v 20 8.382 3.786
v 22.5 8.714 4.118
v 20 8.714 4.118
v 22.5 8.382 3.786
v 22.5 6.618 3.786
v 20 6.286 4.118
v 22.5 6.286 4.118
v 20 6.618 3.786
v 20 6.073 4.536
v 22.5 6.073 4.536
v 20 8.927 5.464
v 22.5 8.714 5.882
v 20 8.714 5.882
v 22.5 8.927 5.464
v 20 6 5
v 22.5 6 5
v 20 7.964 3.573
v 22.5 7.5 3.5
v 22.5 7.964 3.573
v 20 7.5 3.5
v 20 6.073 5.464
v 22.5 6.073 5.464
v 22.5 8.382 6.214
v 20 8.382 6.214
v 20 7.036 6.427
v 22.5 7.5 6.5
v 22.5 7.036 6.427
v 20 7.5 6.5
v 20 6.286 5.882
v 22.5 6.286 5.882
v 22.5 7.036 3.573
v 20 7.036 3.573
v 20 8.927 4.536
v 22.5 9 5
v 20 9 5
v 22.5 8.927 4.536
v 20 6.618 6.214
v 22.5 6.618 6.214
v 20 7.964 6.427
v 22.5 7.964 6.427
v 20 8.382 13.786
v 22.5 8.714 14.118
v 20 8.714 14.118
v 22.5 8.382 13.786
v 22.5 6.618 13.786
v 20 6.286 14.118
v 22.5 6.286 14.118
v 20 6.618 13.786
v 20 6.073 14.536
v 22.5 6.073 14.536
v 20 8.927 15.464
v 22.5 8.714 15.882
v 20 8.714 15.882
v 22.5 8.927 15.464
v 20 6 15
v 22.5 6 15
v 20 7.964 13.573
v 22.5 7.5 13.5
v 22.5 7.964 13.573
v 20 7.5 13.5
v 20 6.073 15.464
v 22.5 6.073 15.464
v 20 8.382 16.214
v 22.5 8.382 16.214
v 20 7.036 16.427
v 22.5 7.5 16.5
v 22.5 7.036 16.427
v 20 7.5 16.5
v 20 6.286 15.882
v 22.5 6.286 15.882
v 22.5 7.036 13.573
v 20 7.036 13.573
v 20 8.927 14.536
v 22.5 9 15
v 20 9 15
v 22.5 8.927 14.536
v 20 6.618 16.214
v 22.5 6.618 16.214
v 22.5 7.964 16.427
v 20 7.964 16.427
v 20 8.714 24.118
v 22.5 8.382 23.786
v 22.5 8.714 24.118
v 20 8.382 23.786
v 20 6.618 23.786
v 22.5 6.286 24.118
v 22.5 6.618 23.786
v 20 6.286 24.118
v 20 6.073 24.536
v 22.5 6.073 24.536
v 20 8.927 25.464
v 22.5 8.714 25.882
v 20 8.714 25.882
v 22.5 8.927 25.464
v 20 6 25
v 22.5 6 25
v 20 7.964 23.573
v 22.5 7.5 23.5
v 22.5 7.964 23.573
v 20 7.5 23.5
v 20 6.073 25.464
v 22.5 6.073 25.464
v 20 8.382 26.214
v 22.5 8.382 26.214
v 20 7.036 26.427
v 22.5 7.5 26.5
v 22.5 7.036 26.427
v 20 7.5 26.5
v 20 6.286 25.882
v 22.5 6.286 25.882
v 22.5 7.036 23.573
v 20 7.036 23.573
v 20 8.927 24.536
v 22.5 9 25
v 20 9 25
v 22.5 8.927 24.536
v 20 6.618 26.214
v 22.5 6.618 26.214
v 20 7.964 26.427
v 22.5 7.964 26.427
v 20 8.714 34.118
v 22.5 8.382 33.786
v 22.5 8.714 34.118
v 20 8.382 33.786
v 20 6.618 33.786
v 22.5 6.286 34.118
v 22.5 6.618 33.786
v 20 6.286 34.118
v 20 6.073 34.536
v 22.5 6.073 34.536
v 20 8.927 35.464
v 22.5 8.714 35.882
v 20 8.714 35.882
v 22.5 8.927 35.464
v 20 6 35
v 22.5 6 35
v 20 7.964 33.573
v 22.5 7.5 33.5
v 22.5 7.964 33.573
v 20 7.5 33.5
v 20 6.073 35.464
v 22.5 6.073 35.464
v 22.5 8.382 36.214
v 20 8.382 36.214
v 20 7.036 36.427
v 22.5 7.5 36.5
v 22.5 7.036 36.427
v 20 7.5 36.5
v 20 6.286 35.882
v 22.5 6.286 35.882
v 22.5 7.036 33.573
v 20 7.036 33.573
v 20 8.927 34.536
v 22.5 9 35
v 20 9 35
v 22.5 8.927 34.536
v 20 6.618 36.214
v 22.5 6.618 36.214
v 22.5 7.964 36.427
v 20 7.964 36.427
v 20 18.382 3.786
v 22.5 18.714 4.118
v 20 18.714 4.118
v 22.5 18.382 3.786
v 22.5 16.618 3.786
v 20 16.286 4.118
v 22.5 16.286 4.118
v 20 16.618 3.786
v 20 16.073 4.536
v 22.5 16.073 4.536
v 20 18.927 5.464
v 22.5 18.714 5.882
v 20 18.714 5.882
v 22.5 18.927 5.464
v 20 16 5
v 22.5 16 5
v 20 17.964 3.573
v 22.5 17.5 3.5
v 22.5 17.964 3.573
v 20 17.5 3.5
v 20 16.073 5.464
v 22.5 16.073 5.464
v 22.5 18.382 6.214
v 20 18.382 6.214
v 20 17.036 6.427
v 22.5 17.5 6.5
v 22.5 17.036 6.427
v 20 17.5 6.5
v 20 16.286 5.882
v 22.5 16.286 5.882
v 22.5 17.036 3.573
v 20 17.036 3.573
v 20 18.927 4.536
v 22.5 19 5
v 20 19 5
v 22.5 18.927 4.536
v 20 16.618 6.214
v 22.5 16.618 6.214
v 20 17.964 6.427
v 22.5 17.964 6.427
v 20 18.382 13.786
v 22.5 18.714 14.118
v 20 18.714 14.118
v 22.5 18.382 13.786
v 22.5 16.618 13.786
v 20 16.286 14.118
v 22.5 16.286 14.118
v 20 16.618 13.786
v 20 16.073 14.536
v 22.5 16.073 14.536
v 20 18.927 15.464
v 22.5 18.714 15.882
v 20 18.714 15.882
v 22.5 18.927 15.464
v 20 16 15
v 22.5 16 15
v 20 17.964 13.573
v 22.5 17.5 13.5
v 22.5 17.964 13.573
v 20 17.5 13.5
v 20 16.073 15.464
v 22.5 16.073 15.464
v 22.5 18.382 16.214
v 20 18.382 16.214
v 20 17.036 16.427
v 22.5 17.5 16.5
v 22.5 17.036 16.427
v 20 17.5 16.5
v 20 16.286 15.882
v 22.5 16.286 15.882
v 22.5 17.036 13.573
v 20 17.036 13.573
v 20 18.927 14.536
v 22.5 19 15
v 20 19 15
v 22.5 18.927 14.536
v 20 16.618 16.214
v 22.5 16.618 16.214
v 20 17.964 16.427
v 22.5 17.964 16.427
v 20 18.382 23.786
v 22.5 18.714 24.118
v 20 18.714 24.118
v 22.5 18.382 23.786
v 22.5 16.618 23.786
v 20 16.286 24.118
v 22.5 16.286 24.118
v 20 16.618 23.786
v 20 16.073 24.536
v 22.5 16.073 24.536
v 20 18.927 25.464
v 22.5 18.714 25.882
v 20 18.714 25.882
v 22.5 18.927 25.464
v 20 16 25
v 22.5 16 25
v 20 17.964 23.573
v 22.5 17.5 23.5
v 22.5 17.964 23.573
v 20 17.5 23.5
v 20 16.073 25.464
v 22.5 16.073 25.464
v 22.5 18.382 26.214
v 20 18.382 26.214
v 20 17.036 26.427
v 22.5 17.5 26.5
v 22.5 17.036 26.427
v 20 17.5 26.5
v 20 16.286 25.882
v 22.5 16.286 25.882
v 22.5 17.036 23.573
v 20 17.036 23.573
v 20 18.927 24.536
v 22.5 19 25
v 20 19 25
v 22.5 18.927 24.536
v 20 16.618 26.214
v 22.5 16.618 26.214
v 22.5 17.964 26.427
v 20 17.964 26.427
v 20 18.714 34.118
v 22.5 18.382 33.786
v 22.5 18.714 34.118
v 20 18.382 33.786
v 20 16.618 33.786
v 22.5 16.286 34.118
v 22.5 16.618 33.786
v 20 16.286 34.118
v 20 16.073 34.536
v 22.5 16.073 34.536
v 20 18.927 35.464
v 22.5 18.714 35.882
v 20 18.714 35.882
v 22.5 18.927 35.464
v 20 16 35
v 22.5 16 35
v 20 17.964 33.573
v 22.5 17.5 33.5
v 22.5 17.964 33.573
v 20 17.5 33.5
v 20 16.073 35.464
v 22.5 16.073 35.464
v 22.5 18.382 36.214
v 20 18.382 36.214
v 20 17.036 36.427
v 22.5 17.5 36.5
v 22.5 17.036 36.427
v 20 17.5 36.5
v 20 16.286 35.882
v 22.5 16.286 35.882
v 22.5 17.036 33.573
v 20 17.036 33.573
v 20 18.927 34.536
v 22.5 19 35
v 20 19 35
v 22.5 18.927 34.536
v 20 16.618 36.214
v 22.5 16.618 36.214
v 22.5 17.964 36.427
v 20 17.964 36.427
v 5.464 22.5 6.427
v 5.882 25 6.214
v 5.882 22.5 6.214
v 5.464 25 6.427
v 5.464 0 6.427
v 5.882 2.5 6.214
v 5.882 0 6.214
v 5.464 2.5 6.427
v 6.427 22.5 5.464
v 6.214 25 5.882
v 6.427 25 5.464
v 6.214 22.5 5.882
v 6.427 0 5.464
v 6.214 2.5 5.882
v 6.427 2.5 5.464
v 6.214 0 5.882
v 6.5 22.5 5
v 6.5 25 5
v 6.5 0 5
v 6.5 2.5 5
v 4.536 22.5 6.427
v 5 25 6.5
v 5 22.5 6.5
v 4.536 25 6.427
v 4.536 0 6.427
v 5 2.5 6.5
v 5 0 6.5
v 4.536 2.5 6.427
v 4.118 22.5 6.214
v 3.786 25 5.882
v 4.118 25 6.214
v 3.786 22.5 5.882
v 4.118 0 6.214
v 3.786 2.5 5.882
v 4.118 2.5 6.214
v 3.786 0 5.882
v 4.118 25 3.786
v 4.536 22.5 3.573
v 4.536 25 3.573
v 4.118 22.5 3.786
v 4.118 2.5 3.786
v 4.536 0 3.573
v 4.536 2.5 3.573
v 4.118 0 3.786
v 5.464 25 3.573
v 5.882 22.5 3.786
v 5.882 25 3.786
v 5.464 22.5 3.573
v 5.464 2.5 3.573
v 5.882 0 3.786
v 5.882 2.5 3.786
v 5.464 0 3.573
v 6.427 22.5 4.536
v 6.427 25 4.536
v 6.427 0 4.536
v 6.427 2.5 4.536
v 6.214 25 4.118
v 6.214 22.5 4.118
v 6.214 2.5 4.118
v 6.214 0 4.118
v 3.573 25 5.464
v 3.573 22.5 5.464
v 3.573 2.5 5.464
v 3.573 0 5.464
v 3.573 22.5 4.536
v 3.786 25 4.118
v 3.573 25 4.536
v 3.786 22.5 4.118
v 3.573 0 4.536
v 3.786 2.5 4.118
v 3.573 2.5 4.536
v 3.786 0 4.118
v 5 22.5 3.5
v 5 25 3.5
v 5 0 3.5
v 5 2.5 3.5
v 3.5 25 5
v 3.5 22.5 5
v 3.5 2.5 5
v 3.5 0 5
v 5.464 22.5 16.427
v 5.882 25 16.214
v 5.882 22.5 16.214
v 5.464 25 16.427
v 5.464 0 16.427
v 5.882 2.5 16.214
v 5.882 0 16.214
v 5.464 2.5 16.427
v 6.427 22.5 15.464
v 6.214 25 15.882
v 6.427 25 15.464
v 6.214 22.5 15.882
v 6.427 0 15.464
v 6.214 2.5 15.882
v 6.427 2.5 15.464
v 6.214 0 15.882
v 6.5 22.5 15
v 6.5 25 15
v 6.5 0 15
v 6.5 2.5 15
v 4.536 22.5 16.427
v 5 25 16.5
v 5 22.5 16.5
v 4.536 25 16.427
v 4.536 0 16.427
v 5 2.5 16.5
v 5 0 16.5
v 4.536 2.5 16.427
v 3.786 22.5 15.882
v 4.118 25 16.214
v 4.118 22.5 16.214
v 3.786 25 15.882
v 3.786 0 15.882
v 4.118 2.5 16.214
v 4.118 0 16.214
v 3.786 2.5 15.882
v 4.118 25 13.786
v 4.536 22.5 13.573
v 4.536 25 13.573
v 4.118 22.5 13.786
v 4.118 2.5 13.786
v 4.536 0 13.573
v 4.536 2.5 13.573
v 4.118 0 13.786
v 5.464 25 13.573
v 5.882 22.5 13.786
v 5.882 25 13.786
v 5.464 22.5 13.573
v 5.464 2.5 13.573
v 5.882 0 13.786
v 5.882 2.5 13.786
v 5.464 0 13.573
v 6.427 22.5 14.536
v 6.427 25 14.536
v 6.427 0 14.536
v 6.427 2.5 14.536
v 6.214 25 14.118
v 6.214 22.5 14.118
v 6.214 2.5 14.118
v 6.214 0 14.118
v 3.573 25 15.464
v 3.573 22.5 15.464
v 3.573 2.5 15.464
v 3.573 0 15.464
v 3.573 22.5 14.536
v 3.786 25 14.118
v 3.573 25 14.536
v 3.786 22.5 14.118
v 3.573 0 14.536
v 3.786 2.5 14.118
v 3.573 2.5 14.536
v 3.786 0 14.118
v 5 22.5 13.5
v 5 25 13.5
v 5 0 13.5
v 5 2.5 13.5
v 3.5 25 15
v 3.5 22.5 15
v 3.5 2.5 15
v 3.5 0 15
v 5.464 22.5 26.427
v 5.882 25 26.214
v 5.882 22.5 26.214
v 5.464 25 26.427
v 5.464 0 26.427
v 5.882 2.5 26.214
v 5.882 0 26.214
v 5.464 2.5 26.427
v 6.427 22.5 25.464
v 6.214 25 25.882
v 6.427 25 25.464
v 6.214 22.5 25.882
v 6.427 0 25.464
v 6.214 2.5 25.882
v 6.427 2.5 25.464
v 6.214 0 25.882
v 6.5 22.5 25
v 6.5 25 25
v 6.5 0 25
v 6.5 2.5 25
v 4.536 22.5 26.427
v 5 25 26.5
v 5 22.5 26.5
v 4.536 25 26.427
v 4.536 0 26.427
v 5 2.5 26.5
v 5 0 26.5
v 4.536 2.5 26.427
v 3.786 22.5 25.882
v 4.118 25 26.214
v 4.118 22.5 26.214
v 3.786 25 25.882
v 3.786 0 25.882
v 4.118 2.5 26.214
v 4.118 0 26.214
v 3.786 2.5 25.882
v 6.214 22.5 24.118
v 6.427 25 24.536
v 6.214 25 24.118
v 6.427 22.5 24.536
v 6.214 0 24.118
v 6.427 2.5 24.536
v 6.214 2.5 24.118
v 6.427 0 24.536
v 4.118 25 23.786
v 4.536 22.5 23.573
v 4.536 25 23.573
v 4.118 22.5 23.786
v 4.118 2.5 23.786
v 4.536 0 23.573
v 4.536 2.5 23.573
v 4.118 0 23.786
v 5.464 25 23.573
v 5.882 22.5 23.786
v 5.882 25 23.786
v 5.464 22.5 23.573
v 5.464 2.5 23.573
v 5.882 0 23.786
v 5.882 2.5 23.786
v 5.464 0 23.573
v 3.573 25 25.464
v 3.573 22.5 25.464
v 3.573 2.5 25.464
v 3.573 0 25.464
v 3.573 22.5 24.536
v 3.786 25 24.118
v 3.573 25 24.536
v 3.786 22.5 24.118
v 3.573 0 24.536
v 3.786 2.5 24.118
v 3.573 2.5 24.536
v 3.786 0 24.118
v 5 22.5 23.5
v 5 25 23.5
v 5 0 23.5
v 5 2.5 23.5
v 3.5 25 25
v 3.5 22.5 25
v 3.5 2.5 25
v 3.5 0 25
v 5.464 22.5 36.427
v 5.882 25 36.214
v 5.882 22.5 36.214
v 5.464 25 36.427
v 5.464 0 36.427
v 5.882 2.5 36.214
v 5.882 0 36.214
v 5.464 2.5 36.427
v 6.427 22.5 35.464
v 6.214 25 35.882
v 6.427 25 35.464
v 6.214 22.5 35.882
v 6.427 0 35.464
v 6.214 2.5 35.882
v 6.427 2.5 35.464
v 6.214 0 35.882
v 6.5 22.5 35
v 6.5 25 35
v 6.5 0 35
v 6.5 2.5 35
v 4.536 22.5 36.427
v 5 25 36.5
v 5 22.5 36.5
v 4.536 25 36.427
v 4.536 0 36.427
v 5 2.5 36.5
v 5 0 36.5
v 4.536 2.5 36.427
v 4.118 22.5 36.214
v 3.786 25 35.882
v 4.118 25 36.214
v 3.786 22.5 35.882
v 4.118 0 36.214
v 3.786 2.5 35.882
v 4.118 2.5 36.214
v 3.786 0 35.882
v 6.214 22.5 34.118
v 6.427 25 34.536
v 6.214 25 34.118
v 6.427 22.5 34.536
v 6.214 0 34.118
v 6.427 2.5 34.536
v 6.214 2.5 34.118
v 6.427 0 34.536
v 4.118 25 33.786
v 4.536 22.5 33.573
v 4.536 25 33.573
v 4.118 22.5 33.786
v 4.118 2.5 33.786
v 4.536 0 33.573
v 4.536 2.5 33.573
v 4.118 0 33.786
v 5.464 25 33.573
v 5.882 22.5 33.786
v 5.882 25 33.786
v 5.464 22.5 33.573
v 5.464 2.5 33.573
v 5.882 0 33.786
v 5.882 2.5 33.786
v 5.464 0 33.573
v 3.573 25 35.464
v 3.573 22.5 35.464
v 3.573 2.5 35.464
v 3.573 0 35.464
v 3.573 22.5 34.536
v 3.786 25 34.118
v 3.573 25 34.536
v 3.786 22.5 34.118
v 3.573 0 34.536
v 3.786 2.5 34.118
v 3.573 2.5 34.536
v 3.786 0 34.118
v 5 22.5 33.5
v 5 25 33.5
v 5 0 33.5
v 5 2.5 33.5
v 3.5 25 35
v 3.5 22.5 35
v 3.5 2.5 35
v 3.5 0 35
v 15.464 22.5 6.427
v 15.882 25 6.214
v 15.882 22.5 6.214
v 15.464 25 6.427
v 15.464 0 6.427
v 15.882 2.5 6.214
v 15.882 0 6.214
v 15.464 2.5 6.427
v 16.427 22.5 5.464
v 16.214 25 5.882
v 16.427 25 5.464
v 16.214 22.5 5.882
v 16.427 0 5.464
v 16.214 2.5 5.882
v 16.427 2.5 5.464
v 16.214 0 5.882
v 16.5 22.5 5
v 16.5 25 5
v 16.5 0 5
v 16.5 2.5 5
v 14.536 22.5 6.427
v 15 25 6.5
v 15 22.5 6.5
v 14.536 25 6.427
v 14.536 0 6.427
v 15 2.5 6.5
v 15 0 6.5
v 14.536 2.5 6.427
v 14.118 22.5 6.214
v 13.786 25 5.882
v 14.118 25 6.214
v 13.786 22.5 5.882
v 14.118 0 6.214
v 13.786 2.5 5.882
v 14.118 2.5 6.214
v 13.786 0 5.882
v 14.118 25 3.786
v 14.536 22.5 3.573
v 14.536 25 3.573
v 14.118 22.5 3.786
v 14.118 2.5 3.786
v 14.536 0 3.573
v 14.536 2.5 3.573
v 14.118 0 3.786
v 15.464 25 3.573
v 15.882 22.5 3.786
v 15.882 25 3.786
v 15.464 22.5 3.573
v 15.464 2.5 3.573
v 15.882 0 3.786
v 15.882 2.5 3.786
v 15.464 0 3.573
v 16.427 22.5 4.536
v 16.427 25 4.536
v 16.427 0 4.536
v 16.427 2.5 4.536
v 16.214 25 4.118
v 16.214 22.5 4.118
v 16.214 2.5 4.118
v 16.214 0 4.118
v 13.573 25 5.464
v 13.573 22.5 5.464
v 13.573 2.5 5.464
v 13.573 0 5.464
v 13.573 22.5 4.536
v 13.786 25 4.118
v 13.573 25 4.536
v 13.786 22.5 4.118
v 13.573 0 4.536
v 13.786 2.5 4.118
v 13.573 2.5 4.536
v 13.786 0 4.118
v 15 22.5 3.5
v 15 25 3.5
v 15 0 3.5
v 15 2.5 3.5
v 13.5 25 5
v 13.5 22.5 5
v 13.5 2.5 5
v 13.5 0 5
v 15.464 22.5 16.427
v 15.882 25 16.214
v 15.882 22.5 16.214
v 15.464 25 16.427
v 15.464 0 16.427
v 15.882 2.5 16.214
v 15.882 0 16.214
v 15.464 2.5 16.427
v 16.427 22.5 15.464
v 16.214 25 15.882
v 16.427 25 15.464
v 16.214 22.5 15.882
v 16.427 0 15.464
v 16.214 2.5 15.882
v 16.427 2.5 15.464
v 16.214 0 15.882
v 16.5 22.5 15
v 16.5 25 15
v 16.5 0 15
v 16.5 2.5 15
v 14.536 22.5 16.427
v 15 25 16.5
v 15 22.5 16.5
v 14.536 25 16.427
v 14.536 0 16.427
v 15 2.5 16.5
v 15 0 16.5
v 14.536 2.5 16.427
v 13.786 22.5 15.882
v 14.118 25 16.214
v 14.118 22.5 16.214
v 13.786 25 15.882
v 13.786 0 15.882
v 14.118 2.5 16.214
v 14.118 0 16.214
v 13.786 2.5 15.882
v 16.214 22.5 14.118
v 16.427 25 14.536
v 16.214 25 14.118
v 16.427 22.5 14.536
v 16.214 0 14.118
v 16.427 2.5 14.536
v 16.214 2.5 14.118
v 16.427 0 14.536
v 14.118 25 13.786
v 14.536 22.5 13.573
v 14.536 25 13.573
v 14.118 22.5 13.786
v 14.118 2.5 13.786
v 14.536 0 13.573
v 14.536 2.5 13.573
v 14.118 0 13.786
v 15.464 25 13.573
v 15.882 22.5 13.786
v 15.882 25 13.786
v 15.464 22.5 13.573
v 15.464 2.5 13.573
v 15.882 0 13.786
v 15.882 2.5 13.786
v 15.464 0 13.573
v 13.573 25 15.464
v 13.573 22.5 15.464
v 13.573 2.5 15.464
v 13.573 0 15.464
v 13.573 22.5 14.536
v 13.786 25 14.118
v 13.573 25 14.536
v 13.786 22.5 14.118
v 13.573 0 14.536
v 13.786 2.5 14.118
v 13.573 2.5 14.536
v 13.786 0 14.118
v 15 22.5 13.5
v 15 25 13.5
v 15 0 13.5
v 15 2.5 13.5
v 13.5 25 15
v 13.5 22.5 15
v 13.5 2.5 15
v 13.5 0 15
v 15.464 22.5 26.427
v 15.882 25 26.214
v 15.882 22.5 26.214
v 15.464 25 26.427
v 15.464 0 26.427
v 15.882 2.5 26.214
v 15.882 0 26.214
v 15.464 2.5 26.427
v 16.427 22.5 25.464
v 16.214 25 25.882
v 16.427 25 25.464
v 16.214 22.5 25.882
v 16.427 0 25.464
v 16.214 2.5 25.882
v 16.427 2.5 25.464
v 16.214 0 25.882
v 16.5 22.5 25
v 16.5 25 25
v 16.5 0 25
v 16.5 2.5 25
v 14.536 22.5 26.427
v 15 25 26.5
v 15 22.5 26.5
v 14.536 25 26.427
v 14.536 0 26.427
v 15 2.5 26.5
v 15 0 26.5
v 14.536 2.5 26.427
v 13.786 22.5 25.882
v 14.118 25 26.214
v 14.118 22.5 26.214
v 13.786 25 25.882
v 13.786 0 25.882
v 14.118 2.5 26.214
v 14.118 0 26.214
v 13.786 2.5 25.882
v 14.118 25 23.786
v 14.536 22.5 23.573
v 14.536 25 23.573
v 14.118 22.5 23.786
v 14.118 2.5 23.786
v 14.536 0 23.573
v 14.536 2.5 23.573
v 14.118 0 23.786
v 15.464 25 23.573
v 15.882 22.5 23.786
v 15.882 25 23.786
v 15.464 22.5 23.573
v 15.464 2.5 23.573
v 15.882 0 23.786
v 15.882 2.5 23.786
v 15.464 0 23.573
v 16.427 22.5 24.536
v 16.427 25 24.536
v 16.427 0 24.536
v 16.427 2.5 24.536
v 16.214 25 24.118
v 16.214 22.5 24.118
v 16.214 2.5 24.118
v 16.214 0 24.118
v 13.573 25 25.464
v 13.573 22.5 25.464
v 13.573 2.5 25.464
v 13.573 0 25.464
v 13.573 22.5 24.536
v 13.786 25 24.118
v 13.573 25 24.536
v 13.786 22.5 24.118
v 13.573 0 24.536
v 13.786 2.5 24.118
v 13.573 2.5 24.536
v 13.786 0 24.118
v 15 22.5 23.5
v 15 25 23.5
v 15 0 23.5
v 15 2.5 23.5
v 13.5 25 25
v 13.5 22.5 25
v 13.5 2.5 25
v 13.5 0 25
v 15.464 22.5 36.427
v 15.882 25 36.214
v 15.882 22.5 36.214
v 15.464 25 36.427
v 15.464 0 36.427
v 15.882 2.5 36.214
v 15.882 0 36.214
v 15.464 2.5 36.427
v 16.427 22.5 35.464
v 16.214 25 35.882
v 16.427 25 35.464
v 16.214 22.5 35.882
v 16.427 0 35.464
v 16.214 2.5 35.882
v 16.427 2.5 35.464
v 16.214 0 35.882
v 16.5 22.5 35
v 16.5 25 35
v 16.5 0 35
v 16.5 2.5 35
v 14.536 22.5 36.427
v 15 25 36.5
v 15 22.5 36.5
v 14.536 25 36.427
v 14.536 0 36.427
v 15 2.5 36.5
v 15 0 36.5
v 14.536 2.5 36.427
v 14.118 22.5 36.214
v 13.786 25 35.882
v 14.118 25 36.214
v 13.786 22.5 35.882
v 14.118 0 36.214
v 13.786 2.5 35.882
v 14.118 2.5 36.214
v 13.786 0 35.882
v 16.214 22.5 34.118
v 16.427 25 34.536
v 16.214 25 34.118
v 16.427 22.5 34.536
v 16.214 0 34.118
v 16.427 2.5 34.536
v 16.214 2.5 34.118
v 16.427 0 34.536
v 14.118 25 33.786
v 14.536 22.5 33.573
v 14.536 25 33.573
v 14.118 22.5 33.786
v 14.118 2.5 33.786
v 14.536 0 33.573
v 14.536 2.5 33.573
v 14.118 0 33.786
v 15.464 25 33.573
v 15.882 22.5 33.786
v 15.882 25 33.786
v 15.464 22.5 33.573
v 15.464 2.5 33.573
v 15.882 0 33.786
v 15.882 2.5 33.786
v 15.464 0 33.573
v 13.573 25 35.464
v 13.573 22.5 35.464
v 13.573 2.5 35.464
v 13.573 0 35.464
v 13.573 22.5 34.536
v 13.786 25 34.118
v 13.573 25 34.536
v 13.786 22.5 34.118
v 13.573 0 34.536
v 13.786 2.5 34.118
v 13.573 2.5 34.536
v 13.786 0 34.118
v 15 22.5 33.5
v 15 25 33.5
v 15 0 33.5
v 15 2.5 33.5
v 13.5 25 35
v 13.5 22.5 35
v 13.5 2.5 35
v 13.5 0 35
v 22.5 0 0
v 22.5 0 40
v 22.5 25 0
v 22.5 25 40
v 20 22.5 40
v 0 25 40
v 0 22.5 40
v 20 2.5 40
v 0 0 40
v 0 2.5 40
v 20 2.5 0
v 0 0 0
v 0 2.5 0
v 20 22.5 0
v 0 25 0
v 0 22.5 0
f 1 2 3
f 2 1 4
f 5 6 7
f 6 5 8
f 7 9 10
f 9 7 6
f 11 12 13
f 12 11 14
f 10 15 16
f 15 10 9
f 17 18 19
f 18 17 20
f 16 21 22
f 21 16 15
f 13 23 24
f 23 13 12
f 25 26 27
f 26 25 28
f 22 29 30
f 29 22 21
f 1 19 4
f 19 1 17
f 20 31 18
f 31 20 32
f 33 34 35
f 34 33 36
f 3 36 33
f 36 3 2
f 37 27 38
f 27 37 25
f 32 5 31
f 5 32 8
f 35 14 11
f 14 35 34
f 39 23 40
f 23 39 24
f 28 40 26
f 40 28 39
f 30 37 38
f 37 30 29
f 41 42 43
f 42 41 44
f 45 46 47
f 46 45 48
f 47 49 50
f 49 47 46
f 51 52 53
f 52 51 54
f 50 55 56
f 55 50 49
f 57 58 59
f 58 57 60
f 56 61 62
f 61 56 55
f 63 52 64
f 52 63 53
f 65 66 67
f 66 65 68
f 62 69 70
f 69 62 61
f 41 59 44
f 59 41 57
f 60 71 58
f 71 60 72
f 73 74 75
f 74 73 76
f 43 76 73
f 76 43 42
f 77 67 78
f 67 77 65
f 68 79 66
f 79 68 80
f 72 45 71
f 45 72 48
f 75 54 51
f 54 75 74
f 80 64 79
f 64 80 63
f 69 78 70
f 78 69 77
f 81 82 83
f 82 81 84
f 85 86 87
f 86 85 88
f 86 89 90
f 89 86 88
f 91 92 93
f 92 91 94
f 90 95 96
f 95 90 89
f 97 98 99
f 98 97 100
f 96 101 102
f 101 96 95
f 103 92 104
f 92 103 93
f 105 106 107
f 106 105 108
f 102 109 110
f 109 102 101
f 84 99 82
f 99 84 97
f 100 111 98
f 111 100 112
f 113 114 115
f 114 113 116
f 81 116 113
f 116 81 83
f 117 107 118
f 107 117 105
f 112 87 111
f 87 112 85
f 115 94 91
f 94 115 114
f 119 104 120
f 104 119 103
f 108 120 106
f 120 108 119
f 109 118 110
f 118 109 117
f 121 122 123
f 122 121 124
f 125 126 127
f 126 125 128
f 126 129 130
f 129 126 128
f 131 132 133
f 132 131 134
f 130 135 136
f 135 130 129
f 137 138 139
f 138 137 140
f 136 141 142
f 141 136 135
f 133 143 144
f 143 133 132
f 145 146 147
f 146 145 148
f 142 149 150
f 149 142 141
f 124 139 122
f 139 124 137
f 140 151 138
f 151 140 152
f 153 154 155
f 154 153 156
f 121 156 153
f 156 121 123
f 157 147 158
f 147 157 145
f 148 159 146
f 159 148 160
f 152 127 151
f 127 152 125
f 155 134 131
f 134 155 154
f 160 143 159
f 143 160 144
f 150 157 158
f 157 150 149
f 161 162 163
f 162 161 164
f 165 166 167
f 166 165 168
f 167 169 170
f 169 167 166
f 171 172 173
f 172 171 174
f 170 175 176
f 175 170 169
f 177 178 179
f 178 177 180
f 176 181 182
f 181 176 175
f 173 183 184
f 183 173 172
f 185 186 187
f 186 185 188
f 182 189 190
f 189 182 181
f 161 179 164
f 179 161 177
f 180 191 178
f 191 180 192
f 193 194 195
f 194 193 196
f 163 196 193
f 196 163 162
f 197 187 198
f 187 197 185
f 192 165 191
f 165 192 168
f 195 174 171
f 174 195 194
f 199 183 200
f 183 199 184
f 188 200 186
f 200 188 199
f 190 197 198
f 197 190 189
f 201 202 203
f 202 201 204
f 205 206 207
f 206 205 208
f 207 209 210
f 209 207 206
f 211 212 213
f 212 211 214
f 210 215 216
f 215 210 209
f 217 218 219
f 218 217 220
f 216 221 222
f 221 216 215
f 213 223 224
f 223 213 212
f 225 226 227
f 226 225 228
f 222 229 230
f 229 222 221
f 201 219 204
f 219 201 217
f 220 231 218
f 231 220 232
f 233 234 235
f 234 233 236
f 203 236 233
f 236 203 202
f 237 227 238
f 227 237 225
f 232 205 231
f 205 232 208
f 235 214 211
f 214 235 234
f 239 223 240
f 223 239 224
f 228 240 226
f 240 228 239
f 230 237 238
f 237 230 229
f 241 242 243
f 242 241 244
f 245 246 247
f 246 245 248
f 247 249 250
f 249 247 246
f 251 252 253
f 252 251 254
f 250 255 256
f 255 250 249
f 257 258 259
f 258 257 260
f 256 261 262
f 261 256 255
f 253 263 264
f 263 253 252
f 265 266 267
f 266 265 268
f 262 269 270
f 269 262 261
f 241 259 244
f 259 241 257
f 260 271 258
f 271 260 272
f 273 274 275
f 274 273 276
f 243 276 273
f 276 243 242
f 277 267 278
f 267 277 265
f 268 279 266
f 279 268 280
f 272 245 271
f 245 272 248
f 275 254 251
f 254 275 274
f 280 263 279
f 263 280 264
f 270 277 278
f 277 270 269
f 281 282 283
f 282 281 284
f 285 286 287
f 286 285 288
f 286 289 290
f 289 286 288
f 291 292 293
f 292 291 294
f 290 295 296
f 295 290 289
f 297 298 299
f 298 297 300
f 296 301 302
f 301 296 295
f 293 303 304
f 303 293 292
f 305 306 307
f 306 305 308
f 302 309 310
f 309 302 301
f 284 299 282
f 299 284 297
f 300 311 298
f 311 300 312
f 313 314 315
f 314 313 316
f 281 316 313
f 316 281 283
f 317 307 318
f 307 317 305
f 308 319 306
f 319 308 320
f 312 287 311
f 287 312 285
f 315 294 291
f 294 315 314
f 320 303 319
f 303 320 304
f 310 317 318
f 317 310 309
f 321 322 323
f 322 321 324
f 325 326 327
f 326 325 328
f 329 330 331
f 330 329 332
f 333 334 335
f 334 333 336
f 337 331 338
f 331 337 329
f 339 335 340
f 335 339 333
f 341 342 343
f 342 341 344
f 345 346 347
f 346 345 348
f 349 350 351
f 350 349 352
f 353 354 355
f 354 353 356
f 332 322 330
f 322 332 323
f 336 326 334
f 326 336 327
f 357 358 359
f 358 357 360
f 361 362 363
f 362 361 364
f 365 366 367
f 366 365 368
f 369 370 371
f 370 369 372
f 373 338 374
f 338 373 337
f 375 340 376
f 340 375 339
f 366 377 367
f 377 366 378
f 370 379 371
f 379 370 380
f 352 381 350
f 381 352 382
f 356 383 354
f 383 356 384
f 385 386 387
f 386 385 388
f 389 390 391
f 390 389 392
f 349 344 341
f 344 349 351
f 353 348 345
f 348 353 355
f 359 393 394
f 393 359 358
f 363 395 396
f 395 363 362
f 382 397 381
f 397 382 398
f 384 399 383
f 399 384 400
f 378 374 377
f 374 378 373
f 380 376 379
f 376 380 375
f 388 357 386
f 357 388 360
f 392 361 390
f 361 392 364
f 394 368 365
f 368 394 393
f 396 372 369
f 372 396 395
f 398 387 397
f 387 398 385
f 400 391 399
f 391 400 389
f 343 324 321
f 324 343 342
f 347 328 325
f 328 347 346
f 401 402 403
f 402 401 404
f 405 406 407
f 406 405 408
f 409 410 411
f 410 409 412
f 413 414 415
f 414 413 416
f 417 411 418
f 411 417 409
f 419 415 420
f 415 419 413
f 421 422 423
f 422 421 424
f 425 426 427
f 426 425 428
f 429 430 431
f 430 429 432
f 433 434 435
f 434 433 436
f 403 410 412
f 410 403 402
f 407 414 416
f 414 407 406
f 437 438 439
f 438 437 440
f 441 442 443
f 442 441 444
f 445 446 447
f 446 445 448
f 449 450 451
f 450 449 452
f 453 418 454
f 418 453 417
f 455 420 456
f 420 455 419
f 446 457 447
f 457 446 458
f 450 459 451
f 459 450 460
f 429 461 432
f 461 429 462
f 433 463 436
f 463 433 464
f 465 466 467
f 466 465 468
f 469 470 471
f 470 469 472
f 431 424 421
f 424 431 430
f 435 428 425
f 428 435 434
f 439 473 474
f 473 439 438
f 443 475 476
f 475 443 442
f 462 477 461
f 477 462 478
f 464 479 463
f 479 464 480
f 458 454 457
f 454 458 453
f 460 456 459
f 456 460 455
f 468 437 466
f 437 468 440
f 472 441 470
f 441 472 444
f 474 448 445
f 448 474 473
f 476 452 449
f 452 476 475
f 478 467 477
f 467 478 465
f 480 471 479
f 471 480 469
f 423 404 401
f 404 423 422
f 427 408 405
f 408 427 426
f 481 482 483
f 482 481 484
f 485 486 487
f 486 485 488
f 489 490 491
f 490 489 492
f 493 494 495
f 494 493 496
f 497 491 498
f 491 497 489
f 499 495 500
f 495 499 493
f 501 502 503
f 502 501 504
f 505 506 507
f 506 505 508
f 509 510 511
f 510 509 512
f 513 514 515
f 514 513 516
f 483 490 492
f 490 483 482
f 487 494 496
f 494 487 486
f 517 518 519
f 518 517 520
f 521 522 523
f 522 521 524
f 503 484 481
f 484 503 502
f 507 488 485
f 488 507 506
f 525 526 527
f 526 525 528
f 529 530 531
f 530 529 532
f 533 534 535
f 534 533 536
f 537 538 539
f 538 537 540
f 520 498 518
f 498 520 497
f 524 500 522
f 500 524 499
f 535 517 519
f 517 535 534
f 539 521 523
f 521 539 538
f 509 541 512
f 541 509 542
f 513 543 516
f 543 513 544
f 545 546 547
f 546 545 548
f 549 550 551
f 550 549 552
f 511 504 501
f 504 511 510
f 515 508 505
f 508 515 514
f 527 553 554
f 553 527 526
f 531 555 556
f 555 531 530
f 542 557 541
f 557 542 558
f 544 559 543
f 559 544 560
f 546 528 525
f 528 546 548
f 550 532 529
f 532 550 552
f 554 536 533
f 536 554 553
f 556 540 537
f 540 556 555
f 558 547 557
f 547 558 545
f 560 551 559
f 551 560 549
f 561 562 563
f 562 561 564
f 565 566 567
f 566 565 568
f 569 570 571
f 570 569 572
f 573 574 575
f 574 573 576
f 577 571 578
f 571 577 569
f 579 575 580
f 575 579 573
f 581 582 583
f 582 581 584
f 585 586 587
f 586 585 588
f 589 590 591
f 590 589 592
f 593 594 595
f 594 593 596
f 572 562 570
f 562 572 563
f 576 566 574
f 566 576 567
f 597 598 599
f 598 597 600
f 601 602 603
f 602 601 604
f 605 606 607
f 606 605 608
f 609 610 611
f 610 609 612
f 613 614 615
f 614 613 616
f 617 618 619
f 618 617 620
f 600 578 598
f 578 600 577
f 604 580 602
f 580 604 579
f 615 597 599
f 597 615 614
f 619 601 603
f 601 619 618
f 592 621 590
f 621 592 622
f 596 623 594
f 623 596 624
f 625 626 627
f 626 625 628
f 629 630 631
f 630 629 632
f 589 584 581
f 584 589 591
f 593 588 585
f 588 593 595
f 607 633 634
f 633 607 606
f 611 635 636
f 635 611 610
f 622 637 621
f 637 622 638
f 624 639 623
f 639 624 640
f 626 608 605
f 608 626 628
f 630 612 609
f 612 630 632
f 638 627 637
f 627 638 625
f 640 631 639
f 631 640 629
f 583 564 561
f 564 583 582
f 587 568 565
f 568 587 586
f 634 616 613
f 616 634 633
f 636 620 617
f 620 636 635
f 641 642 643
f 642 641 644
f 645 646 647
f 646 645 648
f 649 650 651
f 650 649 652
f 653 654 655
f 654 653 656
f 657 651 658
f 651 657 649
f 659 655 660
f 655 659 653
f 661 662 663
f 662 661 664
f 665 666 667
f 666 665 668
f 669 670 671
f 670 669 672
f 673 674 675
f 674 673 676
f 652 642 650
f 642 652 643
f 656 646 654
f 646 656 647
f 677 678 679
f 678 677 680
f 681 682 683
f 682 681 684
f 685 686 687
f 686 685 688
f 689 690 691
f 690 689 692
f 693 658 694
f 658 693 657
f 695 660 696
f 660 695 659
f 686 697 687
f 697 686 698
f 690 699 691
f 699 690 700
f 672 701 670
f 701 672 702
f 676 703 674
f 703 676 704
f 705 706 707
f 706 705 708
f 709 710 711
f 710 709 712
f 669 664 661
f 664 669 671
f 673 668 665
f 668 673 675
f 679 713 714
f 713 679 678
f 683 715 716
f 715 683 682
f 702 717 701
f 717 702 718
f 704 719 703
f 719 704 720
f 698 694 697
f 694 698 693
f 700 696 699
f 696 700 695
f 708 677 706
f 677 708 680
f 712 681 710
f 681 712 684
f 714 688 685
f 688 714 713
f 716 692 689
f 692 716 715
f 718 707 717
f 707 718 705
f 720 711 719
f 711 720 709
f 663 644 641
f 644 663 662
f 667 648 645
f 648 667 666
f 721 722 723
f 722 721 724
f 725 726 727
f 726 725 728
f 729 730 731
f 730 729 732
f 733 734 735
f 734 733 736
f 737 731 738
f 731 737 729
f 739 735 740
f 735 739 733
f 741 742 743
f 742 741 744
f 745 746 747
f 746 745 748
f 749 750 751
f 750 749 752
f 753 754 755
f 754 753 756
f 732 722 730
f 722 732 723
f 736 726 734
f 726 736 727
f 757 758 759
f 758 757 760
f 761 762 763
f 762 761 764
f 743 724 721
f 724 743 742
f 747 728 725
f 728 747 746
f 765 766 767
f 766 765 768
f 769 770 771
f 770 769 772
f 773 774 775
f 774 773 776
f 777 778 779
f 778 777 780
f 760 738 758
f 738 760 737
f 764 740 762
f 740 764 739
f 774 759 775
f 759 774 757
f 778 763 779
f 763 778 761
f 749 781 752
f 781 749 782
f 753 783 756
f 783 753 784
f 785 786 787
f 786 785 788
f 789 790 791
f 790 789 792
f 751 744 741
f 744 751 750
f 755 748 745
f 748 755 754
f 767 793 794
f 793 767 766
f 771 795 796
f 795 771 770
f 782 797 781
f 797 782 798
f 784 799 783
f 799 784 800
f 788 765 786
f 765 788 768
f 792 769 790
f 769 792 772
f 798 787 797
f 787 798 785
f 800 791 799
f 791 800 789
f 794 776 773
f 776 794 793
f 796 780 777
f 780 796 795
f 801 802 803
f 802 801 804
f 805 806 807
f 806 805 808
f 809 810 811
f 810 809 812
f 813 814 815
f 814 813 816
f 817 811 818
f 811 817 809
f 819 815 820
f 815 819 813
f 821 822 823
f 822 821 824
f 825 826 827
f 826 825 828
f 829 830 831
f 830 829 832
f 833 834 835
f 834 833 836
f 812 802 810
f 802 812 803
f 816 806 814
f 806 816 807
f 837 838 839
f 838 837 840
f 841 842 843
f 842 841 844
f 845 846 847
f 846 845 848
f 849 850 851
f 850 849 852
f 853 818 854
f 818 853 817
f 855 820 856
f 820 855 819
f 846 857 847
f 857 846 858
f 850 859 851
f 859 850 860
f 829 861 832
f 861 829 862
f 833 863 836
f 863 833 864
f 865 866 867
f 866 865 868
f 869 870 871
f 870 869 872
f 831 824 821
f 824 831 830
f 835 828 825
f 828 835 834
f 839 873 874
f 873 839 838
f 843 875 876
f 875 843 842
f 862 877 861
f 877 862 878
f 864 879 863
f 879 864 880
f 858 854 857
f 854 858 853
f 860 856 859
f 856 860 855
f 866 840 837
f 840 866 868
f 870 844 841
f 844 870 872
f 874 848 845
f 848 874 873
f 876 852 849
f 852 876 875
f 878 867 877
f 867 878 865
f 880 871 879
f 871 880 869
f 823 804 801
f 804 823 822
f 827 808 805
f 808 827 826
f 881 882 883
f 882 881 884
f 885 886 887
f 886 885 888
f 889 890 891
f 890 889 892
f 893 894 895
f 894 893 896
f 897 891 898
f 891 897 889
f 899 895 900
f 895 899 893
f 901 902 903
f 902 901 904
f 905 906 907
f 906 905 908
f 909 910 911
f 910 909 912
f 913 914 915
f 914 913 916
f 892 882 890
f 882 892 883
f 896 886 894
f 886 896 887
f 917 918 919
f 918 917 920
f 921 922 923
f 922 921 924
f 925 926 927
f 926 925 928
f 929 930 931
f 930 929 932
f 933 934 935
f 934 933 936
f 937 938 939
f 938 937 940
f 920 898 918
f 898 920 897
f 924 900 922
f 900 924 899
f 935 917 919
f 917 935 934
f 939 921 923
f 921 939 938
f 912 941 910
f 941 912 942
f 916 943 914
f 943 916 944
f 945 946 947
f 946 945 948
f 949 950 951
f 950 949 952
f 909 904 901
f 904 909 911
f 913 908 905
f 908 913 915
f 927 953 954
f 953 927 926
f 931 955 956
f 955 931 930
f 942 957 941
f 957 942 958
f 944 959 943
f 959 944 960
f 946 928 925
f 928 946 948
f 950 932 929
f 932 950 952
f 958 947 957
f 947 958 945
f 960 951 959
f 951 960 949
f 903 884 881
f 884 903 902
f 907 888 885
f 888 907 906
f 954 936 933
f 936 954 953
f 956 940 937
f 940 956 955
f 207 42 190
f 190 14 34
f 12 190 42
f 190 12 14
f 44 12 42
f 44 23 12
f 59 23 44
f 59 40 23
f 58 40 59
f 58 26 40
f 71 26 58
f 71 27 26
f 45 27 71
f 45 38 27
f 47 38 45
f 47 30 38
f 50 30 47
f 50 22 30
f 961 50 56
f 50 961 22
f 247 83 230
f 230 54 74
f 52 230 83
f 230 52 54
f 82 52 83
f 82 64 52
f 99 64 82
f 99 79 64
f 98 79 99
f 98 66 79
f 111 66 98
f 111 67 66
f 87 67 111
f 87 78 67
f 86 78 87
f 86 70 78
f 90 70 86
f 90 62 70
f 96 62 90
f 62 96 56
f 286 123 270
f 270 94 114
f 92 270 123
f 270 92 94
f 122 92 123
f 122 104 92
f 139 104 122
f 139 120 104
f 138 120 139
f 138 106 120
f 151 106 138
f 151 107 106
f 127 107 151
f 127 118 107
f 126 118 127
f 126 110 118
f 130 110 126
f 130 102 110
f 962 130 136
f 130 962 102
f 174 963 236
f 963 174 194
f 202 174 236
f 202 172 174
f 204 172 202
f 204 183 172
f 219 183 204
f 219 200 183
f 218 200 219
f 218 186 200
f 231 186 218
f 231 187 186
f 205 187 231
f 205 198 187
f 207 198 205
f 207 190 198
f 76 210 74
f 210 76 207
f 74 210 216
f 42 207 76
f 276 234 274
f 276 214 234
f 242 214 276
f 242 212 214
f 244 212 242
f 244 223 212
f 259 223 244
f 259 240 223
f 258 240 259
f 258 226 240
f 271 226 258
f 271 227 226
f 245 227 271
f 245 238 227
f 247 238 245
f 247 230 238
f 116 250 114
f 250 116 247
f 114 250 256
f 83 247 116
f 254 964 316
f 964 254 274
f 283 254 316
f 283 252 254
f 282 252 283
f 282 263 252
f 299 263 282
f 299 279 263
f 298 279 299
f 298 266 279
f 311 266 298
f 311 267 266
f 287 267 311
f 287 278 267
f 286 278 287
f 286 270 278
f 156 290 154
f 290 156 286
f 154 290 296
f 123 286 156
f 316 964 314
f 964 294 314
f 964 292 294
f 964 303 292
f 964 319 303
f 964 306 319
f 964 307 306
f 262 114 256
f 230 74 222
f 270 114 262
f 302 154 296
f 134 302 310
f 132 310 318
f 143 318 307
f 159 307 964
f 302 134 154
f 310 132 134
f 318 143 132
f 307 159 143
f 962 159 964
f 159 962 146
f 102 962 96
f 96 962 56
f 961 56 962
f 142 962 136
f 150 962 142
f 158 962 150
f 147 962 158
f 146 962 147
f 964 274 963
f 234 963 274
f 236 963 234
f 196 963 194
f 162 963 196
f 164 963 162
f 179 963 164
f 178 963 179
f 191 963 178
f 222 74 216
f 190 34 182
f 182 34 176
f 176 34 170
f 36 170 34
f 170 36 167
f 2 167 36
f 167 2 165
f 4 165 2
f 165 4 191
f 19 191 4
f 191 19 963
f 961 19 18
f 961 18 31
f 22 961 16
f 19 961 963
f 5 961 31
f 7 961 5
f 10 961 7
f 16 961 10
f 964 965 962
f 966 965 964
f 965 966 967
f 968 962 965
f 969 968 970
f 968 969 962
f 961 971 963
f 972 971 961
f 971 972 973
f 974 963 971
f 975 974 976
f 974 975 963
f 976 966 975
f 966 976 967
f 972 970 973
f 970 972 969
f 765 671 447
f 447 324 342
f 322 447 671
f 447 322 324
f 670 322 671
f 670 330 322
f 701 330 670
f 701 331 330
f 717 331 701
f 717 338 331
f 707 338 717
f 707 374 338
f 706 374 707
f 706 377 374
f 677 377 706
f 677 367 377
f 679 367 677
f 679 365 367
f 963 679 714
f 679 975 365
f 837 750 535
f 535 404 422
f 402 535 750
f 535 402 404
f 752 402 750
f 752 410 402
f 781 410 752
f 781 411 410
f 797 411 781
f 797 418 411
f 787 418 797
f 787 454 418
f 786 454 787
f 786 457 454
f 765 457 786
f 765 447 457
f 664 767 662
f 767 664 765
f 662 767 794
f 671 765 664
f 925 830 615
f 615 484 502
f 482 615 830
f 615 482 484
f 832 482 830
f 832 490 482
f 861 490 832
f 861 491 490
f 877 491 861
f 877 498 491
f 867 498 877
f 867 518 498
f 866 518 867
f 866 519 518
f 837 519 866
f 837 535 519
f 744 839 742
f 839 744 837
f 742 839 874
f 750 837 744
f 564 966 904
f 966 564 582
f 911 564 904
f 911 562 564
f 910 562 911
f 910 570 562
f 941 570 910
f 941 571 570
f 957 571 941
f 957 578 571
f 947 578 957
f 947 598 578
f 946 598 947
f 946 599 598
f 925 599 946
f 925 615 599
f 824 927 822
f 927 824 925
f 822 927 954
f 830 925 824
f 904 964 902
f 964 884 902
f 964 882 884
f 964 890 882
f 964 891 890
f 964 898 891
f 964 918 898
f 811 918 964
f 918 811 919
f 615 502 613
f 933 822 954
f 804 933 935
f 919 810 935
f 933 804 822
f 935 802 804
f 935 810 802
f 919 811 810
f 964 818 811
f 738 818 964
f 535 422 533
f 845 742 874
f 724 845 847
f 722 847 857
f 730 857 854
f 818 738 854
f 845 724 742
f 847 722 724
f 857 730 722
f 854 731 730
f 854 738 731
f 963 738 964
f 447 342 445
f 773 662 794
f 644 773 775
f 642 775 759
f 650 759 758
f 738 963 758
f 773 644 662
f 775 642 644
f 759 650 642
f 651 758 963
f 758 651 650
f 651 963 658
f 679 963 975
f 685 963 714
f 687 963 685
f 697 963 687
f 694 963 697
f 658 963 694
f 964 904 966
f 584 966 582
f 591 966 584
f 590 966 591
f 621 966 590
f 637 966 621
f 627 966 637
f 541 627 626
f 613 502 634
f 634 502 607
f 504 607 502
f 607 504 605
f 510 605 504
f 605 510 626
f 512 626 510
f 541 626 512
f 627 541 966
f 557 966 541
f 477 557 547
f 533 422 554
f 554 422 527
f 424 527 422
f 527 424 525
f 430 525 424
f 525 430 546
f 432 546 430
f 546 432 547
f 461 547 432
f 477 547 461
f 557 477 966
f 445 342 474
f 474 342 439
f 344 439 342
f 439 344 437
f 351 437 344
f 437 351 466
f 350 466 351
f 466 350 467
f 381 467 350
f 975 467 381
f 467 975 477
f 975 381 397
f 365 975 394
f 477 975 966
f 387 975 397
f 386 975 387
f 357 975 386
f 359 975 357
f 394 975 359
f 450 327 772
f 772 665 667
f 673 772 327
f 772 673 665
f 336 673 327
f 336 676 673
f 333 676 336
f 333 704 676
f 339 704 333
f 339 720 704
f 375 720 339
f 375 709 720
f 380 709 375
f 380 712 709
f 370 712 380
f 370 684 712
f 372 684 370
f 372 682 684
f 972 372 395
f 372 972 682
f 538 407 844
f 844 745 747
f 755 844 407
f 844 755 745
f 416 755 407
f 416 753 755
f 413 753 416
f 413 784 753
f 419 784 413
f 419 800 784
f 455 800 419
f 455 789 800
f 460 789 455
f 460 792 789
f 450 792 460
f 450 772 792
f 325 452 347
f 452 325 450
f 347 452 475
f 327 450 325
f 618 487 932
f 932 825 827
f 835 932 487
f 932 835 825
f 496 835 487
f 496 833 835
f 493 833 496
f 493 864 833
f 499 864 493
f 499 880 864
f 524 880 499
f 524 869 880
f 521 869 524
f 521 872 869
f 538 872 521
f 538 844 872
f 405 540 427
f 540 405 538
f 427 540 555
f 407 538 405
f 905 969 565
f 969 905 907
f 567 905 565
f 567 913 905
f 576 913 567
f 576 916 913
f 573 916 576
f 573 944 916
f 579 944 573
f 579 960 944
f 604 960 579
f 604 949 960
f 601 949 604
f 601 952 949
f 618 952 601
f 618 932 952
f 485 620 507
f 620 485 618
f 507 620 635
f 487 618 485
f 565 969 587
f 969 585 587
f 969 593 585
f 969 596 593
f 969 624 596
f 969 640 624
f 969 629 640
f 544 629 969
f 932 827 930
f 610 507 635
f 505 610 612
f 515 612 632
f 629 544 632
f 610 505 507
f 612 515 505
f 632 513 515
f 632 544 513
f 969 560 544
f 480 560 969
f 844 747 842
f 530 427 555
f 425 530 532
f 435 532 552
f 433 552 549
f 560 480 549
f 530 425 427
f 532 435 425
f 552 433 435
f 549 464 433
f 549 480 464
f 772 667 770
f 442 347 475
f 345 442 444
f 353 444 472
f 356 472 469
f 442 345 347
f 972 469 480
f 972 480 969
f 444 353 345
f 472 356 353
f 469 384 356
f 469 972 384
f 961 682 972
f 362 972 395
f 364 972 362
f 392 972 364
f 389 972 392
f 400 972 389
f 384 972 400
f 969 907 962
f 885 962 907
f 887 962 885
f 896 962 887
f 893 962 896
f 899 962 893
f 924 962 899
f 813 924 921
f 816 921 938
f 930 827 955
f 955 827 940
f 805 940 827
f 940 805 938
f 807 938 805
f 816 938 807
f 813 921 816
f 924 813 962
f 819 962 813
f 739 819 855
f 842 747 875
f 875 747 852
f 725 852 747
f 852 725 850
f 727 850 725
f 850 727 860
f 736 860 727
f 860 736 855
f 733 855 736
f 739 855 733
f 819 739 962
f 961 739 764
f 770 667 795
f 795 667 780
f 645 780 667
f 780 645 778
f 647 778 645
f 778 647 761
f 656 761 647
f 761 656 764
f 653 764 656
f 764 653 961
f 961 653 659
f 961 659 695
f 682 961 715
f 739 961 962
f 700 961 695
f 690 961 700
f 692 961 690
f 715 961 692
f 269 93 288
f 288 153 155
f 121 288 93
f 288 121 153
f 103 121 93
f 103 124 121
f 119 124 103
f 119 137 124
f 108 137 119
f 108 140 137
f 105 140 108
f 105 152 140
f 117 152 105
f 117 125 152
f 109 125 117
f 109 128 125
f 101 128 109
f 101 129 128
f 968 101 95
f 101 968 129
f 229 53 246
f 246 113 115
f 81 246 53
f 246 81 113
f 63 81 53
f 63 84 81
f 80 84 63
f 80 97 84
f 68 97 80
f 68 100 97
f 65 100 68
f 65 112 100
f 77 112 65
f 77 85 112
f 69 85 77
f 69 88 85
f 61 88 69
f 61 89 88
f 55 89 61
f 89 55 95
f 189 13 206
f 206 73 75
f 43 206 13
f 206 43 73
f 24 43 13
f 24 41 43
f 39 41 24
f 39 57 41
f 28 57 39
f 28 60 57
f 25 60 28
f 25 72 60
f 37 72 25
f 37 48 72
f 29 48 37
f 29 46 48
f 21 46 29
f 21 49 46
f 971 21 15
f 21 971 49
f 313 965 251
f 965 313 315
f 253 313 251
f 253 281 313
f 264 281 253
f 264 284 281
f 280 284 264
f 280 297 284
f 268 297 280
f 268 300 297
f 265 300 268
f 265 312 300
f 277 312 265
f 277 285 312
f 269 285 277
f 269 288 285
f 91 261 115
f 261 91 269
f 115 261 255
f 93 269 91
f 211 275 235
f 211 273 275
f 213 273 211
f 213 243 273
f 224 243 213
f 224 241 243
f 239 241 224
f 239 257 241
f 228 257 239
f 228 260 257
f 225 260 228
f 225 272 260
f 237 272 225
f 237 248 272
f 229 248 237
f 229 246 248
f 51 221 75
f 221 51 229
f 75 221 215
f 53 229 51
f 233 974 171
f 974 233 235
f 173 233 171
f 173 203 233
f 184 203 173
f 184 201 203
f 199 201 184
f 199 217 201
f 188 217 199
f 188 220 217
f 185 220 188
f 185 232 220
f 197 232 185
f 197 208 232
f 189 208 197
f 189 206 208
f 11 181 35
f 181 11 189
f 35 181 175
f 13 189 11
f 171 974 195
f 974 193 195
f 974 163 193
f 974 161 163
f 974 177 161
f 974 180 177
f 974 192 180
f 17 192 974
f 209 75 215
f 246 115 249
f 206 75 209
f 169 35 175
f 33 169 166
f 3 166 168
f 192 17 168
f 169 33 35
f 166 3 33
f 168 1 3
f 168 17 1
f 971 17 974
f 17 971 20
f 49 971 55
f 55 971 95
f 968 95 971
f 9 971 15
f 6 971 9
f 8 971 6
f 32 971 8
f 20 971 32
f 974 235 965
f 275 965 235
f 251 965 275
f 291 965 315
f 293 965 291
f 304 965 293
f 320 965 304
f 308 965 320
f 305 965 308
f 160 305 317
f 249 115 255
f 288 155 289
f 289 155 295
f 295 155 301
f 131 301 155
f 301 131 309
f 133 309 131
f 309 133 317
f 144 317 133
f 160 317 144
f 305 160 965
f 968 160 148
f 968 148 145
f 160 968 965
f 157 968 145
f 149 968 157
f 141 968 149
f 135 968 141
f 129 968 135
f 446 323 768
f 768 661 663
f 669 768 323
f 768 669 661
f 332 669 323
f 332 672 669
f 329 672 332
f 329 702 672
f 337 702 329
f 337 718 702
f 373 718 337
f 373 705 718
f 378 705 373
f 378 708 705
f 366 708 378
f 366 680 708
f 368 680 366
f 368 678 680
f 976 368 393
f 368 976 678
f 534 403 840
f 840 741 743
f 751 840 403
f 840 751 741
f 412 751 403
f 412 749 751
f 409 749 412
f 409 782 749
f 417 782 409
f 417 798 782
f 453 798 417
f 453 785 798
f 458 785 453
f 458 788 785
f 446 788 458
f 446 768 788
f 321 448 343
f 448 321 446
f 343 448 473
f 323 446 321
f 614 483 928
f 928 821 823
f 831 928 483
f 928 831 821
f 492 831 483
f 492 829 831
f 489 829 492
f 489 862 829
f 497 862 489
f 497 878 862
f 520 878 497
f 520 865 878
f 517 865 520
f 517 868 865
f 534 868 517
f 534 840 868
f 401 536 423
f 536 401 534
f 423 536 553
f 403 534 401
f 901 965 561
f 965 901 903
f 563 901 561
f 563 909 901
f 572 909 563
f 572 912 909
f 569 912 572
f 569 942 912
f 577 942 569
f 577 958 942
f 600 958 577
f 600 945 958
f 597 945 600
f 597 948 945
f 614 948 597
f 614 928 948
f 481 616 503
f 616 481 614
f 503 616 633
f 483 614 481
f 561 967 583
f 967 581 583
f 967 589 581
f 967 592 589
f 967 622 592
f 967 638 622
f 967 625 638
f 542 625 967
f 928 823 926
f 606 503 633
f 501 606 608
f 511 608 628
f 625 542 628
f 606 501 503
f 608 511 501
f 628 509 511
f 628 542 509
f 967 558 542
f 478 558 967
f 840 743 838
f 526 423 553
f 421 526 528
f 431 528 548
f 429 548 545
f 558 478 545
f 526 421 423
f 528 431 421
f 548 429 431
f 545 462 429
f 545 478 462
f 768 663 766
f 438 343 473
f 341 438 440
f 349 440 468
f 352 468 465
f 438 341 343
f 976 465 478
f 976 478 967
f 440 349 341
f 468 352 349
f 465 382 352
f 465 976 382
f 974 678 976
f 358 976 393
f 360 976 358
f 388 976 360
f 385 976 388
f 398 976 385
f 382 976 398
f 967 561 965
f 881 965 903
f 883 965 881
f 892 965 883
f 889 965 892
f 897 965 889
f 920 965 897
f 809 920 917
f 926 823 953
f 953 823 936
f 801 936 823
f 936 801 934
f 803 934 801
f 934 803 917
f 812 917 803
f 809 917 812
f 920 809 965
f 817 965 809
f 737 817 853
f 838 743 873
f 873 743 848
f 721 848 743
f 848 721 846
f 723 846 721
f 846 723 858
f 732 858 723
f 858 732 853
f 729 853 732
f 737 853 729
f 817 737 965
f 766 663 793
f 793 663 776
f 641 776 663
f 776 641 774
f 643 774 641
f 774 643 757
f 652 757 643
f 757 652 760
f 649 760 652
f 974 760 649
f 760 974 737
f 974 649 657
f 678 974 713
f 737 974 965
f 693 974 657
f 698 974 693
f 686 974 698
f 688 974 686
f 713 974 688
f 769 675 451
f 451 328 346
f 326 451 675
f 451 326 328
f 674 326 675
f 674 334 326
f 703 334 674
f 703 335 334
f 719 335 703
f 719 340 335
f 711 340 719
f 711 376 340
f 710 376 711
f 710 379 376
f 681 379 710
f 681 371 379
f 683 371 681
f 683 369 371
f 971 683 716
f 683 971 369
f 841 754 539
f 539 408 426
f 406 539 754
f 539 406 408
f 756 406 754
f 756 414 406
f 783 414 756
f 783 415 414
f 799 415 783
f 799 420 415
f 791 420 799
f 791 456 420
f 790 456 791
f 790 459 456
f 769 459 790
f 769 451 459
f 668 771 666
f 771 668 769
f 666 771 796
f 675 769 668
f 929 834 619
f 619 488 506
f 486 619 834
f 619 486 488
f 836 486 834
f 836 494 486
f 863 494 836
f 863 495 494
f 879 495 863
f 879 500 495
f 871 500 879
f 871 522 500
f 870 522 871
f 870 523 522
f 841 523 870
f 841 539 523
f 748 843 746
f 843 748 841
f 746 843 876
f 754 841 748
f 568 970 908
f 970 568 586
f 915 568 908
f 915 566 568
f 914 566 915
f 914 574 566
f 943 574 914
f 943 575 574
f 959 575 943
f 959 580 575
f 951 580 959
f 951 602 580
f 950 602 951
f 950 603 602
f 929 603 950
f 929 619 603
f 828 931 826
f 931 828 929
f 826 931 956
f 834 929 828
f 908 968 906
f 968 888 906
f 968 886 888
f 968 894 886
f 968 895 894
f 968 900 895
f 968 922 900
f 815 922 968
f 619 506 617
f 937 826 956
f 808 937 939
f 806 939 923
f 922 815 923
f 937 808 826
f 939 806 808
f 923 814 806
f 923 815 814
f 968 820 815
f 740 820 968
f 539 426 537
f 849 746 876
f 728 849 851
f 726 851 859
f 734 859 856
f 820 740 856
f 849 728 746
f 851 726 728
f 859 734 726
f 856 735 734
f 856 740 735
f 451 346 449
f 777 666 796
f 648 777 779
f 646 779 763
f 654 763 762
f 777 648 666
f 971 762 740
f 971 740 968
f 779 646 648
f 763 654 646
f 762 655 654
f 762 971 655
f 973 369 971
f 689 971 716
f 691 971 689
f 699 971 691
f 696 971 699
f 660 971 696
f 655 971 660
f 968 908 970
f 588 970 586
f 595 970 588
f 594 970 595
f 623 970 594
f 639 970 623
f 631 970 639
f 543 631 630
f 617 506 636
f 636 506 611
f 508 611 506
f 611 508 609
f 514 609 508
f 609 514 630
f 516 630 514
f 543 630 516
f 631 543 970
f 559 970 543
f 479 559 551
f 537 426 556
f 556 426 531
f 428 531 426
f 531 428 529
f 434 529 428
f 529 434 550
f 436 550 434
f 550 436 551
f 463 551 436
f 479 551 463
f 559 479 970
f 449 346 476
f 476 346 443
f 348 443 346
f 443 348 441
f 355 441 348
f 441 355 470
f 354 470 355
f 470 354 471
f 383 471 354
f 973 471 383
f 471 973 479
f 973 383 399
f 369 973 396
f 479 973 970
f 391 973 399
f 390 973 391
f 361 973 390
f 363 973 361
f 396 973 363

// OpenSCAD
/*                             
Partform path:          M3_structure_shell_cee
Version:                1.0.0
Version notes:          Initial partform with core geometry only. Non-optimized.
Monikers:               "cee" "cee channel" "plain cee" 
contributors:           Alex Penney
*/

//BEGIN OPTIONS - edit these parameters to generate custom parts of this form.

N = 2; //whole number of 10mm units along the X axis
M = 2; //whole number of 10mm units along the Y axis
H = 4; //whole number of 10mm units along the Z axis.

$fn=20;

THICKNESS = 2.5; //Nominal 2.5mm - thickness of the two "walls" of the part

HOLE_DIAMETER = 3.0; //Nominal 3.0mm - common diameter of holes throughout

HOLE_FACES = 20; //Default 20 - higher number => slower render, smoother holes

//END OPTIONS - edit all else at your own risk


overall_width = 10*N + THICKNESS;
overall_length = 10*M + 2*THICKNESS;
overall_height = 10*H;

difference(){
    //main cube
    cube([overall_width,overall_length,overall_height]);
    
    //inner cutting cube
    translate([0,THICKNESS,-5]){
        cube([10*N,10*M,overall_height+10]);
    }
    
    //holes parallel to x-axis
    for(i=[0:M-1]){
        for(j=[0:H-1]){
            translate([0,THICKNESS+5+(10*i),5+(10*j)])
            rotate(90,[0,1,0])
            cylinder(h=overall_width*3,d=HOLE_DIAMETER,center=true);
        }
    }
    
    //holes parallel to y-axis
    for(p=[0:N-1]){
        for(q=[0:H-1]){
            translate([5+(10*p),0,5+(10*q)])
            rotate(90,[1,0,0])
            cylinder(h=overall_length*3,d=HOLE_DIAMETER,center=true);
        }
    }
    
}
